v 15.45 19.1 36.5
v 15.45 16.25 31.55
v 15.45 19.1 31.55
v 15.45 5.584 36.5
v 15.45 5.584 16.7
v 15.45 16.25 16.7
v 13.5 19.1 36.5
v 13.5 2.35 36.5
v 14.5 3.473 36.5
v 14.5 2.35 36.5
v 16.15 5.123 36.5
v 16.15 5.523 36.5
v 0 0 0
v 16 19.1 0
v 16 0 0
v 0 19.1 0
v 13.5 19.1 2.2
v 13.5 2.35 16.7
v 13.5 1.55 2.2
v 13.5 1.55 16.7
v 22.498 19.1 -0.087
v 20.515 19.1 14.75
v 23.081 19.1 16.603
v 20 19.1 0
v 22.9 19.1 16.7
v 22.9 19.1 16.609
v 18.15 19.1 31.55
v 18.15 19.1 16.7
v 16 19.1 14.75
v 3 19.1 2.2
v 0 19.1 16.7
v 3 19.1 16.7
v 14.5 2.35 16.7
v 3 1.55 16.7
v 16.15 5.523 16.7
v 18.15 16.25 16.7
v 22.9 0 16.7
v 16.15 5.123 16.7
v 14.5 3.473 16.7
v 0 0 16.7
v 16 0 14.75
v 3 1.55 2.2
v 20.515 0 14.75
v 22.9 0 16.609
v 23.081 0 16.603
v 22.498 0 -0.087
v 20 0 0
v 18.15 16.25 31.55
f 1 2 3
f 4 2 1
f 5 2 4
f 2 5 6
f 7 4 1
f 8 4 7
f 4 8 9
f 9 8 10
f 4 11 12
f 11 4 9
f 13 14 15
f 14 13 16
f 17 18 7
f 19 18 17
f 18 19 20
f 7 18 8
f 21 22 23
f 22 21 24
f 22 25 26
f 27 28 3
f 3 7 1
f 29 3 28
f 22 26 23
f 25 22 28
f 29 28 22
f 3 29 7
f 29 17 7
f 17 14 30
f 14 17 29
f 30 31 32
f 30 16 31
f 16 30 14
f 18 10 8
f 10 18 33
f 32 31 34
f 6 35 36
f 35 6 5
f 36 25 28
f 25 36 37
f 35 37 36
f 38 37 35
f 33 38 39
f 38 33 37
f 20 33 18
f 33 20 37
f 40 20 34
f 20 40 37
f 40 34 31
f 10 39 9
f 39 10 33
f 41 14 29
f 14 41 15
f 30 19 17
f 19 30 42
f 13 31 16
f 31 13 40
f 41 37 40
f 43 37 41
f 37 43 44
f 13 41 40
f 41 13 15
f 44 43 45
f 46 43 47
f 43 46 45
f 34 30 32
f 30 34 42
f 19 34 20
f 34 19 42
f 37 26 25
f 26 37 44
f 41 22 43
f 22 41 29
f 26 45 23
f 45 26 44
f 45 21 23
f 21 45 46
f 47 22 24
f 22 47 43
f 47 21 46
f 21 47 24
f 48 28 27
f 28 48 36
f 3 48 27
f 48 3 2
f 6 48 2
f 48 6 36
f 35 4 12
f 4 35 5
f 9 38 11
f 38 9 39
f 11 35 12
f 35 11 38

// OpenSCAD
///////////////////////////////
// USER PARAMETERS
///////////////////////////////

base_length =19.10;
base_width=16;
base_thickness=2.20;

base_outer_wall_height=16.70; //this includes the base thickness
base_outer_wall_thickness=3.0;


base_inner_wall_height=36.50;
base_inner_wall_thickness=1.95;
base_inner_wall_length=16.75;

base_back_thickness=1.55;

clamp_wall_thickness=2.5;
clamp_top_width=9.4;
clamp_top_thickness=1.95;
clamp_inner_offset=4.5;

clamp_front_notch_height=14.85;
clamp_front_notch_thickness=2.85;
clamp_front_notch_width=4.65;
clamp_angle = 2;

clamp_canti_height=2.6;
xtra=0.01;

// //////////////////////////////
//  USAGE EXAMPLE
// //////////////////////////////
rail_blocker();




// //////////////////////////////
// OpenSCAD SCRIPT
// //////////////////////////////

module rail_blocker()
{
	high_wall_offset =base_length-base_inner_wall_length;
	high_wall_cutoff_width=base_inner_wall_thickness-1;
	high_wall_cutoff_length = 3;
	clamp_cantilever_height = base_inner_wall_height-base_outer_wall_height;

	cube([base_width,base_length,base_thickness]);
	cube([base_outer_wall_thickness,base_length,base_outer_wall_height]);
	cube([base_width,base_back_thickness,base_outer_wall_height]);

	//inner, high wall
	difference()
	{
		translate([base_width-clamp_wall_thickness,high_wall_offset,0])
		cube([base_inner_wall_thickness,base_inner_wall_length,base_inner_wall_height]);

		translate([base_width-clamp_wall_thickness+1,high_wall_offset,base_outer_wall_height])
		cube([high_wall_cutoff_width+xtra,high_wall_cutoff_length,clamp_cantilever_height]);

		
	}

	//inner, low wall
	translate([base_width-clamp_wall_thickness,0,0])
	cube([clamp_wall_thickness,base_length,base_outer_wall_height]);

	//clamp elements
	translate([base_width-clamp_wall_thickness,0,base_outer_wall_height-clamp_top_thickness])
	cube([clamp_top_width,base_length,clamp_top_thickness]);

	translate([base_width+clamp_inner_offset-0.5,0,0])  rotate([0,clamp_angle,0])
	cube([clamp_wall_thickness,base_length,base_outer_wall_height]);

	//clamp front notch
	translate([base_width-clamp_wall_thickness,base_length-clamp_front_notch_thickness,base_outer_wall_height])
	cube([clamp_front_notch_width,clamp_front_notch_thickness,clamp_front_notch_height]);

	//clamp slant back
	translate([base_width-base_inner_wall_thickness-0.5,high_wall_offset+clamp_canti_height+0.8,base_outer_wall_height])
	rotate([0,0,90]) mirror([1,0,0])
	cantilever(width=clamp_cantilever_height);

}

module cantilever(h0=0,h1=0,width=4,arm_length=0,land_length=0.4,overhang_depth=clamp_canti_height,angle=45,return_angle=5)
{
	front_length=tan(angle)*overhang_depth;
	back_length=tan(return_angle)*overhang_depth;
	arm_length = arm_length+ front_length+land_length+back_length;

	translate([0,-h0/2,0])
	linear_extrude(height =width)
	{
		
		//head
		polygon(points = 
			[[arm_length,0]
			,[arm_length-front_length,-overhang_depth]
			,[arm_length-front_length-land_length,-overhang_depth]
			,[arm_length-front_length-land_length-back_length,0]
			]
			,paths = [[0,1,2,3]]);
	}
}
